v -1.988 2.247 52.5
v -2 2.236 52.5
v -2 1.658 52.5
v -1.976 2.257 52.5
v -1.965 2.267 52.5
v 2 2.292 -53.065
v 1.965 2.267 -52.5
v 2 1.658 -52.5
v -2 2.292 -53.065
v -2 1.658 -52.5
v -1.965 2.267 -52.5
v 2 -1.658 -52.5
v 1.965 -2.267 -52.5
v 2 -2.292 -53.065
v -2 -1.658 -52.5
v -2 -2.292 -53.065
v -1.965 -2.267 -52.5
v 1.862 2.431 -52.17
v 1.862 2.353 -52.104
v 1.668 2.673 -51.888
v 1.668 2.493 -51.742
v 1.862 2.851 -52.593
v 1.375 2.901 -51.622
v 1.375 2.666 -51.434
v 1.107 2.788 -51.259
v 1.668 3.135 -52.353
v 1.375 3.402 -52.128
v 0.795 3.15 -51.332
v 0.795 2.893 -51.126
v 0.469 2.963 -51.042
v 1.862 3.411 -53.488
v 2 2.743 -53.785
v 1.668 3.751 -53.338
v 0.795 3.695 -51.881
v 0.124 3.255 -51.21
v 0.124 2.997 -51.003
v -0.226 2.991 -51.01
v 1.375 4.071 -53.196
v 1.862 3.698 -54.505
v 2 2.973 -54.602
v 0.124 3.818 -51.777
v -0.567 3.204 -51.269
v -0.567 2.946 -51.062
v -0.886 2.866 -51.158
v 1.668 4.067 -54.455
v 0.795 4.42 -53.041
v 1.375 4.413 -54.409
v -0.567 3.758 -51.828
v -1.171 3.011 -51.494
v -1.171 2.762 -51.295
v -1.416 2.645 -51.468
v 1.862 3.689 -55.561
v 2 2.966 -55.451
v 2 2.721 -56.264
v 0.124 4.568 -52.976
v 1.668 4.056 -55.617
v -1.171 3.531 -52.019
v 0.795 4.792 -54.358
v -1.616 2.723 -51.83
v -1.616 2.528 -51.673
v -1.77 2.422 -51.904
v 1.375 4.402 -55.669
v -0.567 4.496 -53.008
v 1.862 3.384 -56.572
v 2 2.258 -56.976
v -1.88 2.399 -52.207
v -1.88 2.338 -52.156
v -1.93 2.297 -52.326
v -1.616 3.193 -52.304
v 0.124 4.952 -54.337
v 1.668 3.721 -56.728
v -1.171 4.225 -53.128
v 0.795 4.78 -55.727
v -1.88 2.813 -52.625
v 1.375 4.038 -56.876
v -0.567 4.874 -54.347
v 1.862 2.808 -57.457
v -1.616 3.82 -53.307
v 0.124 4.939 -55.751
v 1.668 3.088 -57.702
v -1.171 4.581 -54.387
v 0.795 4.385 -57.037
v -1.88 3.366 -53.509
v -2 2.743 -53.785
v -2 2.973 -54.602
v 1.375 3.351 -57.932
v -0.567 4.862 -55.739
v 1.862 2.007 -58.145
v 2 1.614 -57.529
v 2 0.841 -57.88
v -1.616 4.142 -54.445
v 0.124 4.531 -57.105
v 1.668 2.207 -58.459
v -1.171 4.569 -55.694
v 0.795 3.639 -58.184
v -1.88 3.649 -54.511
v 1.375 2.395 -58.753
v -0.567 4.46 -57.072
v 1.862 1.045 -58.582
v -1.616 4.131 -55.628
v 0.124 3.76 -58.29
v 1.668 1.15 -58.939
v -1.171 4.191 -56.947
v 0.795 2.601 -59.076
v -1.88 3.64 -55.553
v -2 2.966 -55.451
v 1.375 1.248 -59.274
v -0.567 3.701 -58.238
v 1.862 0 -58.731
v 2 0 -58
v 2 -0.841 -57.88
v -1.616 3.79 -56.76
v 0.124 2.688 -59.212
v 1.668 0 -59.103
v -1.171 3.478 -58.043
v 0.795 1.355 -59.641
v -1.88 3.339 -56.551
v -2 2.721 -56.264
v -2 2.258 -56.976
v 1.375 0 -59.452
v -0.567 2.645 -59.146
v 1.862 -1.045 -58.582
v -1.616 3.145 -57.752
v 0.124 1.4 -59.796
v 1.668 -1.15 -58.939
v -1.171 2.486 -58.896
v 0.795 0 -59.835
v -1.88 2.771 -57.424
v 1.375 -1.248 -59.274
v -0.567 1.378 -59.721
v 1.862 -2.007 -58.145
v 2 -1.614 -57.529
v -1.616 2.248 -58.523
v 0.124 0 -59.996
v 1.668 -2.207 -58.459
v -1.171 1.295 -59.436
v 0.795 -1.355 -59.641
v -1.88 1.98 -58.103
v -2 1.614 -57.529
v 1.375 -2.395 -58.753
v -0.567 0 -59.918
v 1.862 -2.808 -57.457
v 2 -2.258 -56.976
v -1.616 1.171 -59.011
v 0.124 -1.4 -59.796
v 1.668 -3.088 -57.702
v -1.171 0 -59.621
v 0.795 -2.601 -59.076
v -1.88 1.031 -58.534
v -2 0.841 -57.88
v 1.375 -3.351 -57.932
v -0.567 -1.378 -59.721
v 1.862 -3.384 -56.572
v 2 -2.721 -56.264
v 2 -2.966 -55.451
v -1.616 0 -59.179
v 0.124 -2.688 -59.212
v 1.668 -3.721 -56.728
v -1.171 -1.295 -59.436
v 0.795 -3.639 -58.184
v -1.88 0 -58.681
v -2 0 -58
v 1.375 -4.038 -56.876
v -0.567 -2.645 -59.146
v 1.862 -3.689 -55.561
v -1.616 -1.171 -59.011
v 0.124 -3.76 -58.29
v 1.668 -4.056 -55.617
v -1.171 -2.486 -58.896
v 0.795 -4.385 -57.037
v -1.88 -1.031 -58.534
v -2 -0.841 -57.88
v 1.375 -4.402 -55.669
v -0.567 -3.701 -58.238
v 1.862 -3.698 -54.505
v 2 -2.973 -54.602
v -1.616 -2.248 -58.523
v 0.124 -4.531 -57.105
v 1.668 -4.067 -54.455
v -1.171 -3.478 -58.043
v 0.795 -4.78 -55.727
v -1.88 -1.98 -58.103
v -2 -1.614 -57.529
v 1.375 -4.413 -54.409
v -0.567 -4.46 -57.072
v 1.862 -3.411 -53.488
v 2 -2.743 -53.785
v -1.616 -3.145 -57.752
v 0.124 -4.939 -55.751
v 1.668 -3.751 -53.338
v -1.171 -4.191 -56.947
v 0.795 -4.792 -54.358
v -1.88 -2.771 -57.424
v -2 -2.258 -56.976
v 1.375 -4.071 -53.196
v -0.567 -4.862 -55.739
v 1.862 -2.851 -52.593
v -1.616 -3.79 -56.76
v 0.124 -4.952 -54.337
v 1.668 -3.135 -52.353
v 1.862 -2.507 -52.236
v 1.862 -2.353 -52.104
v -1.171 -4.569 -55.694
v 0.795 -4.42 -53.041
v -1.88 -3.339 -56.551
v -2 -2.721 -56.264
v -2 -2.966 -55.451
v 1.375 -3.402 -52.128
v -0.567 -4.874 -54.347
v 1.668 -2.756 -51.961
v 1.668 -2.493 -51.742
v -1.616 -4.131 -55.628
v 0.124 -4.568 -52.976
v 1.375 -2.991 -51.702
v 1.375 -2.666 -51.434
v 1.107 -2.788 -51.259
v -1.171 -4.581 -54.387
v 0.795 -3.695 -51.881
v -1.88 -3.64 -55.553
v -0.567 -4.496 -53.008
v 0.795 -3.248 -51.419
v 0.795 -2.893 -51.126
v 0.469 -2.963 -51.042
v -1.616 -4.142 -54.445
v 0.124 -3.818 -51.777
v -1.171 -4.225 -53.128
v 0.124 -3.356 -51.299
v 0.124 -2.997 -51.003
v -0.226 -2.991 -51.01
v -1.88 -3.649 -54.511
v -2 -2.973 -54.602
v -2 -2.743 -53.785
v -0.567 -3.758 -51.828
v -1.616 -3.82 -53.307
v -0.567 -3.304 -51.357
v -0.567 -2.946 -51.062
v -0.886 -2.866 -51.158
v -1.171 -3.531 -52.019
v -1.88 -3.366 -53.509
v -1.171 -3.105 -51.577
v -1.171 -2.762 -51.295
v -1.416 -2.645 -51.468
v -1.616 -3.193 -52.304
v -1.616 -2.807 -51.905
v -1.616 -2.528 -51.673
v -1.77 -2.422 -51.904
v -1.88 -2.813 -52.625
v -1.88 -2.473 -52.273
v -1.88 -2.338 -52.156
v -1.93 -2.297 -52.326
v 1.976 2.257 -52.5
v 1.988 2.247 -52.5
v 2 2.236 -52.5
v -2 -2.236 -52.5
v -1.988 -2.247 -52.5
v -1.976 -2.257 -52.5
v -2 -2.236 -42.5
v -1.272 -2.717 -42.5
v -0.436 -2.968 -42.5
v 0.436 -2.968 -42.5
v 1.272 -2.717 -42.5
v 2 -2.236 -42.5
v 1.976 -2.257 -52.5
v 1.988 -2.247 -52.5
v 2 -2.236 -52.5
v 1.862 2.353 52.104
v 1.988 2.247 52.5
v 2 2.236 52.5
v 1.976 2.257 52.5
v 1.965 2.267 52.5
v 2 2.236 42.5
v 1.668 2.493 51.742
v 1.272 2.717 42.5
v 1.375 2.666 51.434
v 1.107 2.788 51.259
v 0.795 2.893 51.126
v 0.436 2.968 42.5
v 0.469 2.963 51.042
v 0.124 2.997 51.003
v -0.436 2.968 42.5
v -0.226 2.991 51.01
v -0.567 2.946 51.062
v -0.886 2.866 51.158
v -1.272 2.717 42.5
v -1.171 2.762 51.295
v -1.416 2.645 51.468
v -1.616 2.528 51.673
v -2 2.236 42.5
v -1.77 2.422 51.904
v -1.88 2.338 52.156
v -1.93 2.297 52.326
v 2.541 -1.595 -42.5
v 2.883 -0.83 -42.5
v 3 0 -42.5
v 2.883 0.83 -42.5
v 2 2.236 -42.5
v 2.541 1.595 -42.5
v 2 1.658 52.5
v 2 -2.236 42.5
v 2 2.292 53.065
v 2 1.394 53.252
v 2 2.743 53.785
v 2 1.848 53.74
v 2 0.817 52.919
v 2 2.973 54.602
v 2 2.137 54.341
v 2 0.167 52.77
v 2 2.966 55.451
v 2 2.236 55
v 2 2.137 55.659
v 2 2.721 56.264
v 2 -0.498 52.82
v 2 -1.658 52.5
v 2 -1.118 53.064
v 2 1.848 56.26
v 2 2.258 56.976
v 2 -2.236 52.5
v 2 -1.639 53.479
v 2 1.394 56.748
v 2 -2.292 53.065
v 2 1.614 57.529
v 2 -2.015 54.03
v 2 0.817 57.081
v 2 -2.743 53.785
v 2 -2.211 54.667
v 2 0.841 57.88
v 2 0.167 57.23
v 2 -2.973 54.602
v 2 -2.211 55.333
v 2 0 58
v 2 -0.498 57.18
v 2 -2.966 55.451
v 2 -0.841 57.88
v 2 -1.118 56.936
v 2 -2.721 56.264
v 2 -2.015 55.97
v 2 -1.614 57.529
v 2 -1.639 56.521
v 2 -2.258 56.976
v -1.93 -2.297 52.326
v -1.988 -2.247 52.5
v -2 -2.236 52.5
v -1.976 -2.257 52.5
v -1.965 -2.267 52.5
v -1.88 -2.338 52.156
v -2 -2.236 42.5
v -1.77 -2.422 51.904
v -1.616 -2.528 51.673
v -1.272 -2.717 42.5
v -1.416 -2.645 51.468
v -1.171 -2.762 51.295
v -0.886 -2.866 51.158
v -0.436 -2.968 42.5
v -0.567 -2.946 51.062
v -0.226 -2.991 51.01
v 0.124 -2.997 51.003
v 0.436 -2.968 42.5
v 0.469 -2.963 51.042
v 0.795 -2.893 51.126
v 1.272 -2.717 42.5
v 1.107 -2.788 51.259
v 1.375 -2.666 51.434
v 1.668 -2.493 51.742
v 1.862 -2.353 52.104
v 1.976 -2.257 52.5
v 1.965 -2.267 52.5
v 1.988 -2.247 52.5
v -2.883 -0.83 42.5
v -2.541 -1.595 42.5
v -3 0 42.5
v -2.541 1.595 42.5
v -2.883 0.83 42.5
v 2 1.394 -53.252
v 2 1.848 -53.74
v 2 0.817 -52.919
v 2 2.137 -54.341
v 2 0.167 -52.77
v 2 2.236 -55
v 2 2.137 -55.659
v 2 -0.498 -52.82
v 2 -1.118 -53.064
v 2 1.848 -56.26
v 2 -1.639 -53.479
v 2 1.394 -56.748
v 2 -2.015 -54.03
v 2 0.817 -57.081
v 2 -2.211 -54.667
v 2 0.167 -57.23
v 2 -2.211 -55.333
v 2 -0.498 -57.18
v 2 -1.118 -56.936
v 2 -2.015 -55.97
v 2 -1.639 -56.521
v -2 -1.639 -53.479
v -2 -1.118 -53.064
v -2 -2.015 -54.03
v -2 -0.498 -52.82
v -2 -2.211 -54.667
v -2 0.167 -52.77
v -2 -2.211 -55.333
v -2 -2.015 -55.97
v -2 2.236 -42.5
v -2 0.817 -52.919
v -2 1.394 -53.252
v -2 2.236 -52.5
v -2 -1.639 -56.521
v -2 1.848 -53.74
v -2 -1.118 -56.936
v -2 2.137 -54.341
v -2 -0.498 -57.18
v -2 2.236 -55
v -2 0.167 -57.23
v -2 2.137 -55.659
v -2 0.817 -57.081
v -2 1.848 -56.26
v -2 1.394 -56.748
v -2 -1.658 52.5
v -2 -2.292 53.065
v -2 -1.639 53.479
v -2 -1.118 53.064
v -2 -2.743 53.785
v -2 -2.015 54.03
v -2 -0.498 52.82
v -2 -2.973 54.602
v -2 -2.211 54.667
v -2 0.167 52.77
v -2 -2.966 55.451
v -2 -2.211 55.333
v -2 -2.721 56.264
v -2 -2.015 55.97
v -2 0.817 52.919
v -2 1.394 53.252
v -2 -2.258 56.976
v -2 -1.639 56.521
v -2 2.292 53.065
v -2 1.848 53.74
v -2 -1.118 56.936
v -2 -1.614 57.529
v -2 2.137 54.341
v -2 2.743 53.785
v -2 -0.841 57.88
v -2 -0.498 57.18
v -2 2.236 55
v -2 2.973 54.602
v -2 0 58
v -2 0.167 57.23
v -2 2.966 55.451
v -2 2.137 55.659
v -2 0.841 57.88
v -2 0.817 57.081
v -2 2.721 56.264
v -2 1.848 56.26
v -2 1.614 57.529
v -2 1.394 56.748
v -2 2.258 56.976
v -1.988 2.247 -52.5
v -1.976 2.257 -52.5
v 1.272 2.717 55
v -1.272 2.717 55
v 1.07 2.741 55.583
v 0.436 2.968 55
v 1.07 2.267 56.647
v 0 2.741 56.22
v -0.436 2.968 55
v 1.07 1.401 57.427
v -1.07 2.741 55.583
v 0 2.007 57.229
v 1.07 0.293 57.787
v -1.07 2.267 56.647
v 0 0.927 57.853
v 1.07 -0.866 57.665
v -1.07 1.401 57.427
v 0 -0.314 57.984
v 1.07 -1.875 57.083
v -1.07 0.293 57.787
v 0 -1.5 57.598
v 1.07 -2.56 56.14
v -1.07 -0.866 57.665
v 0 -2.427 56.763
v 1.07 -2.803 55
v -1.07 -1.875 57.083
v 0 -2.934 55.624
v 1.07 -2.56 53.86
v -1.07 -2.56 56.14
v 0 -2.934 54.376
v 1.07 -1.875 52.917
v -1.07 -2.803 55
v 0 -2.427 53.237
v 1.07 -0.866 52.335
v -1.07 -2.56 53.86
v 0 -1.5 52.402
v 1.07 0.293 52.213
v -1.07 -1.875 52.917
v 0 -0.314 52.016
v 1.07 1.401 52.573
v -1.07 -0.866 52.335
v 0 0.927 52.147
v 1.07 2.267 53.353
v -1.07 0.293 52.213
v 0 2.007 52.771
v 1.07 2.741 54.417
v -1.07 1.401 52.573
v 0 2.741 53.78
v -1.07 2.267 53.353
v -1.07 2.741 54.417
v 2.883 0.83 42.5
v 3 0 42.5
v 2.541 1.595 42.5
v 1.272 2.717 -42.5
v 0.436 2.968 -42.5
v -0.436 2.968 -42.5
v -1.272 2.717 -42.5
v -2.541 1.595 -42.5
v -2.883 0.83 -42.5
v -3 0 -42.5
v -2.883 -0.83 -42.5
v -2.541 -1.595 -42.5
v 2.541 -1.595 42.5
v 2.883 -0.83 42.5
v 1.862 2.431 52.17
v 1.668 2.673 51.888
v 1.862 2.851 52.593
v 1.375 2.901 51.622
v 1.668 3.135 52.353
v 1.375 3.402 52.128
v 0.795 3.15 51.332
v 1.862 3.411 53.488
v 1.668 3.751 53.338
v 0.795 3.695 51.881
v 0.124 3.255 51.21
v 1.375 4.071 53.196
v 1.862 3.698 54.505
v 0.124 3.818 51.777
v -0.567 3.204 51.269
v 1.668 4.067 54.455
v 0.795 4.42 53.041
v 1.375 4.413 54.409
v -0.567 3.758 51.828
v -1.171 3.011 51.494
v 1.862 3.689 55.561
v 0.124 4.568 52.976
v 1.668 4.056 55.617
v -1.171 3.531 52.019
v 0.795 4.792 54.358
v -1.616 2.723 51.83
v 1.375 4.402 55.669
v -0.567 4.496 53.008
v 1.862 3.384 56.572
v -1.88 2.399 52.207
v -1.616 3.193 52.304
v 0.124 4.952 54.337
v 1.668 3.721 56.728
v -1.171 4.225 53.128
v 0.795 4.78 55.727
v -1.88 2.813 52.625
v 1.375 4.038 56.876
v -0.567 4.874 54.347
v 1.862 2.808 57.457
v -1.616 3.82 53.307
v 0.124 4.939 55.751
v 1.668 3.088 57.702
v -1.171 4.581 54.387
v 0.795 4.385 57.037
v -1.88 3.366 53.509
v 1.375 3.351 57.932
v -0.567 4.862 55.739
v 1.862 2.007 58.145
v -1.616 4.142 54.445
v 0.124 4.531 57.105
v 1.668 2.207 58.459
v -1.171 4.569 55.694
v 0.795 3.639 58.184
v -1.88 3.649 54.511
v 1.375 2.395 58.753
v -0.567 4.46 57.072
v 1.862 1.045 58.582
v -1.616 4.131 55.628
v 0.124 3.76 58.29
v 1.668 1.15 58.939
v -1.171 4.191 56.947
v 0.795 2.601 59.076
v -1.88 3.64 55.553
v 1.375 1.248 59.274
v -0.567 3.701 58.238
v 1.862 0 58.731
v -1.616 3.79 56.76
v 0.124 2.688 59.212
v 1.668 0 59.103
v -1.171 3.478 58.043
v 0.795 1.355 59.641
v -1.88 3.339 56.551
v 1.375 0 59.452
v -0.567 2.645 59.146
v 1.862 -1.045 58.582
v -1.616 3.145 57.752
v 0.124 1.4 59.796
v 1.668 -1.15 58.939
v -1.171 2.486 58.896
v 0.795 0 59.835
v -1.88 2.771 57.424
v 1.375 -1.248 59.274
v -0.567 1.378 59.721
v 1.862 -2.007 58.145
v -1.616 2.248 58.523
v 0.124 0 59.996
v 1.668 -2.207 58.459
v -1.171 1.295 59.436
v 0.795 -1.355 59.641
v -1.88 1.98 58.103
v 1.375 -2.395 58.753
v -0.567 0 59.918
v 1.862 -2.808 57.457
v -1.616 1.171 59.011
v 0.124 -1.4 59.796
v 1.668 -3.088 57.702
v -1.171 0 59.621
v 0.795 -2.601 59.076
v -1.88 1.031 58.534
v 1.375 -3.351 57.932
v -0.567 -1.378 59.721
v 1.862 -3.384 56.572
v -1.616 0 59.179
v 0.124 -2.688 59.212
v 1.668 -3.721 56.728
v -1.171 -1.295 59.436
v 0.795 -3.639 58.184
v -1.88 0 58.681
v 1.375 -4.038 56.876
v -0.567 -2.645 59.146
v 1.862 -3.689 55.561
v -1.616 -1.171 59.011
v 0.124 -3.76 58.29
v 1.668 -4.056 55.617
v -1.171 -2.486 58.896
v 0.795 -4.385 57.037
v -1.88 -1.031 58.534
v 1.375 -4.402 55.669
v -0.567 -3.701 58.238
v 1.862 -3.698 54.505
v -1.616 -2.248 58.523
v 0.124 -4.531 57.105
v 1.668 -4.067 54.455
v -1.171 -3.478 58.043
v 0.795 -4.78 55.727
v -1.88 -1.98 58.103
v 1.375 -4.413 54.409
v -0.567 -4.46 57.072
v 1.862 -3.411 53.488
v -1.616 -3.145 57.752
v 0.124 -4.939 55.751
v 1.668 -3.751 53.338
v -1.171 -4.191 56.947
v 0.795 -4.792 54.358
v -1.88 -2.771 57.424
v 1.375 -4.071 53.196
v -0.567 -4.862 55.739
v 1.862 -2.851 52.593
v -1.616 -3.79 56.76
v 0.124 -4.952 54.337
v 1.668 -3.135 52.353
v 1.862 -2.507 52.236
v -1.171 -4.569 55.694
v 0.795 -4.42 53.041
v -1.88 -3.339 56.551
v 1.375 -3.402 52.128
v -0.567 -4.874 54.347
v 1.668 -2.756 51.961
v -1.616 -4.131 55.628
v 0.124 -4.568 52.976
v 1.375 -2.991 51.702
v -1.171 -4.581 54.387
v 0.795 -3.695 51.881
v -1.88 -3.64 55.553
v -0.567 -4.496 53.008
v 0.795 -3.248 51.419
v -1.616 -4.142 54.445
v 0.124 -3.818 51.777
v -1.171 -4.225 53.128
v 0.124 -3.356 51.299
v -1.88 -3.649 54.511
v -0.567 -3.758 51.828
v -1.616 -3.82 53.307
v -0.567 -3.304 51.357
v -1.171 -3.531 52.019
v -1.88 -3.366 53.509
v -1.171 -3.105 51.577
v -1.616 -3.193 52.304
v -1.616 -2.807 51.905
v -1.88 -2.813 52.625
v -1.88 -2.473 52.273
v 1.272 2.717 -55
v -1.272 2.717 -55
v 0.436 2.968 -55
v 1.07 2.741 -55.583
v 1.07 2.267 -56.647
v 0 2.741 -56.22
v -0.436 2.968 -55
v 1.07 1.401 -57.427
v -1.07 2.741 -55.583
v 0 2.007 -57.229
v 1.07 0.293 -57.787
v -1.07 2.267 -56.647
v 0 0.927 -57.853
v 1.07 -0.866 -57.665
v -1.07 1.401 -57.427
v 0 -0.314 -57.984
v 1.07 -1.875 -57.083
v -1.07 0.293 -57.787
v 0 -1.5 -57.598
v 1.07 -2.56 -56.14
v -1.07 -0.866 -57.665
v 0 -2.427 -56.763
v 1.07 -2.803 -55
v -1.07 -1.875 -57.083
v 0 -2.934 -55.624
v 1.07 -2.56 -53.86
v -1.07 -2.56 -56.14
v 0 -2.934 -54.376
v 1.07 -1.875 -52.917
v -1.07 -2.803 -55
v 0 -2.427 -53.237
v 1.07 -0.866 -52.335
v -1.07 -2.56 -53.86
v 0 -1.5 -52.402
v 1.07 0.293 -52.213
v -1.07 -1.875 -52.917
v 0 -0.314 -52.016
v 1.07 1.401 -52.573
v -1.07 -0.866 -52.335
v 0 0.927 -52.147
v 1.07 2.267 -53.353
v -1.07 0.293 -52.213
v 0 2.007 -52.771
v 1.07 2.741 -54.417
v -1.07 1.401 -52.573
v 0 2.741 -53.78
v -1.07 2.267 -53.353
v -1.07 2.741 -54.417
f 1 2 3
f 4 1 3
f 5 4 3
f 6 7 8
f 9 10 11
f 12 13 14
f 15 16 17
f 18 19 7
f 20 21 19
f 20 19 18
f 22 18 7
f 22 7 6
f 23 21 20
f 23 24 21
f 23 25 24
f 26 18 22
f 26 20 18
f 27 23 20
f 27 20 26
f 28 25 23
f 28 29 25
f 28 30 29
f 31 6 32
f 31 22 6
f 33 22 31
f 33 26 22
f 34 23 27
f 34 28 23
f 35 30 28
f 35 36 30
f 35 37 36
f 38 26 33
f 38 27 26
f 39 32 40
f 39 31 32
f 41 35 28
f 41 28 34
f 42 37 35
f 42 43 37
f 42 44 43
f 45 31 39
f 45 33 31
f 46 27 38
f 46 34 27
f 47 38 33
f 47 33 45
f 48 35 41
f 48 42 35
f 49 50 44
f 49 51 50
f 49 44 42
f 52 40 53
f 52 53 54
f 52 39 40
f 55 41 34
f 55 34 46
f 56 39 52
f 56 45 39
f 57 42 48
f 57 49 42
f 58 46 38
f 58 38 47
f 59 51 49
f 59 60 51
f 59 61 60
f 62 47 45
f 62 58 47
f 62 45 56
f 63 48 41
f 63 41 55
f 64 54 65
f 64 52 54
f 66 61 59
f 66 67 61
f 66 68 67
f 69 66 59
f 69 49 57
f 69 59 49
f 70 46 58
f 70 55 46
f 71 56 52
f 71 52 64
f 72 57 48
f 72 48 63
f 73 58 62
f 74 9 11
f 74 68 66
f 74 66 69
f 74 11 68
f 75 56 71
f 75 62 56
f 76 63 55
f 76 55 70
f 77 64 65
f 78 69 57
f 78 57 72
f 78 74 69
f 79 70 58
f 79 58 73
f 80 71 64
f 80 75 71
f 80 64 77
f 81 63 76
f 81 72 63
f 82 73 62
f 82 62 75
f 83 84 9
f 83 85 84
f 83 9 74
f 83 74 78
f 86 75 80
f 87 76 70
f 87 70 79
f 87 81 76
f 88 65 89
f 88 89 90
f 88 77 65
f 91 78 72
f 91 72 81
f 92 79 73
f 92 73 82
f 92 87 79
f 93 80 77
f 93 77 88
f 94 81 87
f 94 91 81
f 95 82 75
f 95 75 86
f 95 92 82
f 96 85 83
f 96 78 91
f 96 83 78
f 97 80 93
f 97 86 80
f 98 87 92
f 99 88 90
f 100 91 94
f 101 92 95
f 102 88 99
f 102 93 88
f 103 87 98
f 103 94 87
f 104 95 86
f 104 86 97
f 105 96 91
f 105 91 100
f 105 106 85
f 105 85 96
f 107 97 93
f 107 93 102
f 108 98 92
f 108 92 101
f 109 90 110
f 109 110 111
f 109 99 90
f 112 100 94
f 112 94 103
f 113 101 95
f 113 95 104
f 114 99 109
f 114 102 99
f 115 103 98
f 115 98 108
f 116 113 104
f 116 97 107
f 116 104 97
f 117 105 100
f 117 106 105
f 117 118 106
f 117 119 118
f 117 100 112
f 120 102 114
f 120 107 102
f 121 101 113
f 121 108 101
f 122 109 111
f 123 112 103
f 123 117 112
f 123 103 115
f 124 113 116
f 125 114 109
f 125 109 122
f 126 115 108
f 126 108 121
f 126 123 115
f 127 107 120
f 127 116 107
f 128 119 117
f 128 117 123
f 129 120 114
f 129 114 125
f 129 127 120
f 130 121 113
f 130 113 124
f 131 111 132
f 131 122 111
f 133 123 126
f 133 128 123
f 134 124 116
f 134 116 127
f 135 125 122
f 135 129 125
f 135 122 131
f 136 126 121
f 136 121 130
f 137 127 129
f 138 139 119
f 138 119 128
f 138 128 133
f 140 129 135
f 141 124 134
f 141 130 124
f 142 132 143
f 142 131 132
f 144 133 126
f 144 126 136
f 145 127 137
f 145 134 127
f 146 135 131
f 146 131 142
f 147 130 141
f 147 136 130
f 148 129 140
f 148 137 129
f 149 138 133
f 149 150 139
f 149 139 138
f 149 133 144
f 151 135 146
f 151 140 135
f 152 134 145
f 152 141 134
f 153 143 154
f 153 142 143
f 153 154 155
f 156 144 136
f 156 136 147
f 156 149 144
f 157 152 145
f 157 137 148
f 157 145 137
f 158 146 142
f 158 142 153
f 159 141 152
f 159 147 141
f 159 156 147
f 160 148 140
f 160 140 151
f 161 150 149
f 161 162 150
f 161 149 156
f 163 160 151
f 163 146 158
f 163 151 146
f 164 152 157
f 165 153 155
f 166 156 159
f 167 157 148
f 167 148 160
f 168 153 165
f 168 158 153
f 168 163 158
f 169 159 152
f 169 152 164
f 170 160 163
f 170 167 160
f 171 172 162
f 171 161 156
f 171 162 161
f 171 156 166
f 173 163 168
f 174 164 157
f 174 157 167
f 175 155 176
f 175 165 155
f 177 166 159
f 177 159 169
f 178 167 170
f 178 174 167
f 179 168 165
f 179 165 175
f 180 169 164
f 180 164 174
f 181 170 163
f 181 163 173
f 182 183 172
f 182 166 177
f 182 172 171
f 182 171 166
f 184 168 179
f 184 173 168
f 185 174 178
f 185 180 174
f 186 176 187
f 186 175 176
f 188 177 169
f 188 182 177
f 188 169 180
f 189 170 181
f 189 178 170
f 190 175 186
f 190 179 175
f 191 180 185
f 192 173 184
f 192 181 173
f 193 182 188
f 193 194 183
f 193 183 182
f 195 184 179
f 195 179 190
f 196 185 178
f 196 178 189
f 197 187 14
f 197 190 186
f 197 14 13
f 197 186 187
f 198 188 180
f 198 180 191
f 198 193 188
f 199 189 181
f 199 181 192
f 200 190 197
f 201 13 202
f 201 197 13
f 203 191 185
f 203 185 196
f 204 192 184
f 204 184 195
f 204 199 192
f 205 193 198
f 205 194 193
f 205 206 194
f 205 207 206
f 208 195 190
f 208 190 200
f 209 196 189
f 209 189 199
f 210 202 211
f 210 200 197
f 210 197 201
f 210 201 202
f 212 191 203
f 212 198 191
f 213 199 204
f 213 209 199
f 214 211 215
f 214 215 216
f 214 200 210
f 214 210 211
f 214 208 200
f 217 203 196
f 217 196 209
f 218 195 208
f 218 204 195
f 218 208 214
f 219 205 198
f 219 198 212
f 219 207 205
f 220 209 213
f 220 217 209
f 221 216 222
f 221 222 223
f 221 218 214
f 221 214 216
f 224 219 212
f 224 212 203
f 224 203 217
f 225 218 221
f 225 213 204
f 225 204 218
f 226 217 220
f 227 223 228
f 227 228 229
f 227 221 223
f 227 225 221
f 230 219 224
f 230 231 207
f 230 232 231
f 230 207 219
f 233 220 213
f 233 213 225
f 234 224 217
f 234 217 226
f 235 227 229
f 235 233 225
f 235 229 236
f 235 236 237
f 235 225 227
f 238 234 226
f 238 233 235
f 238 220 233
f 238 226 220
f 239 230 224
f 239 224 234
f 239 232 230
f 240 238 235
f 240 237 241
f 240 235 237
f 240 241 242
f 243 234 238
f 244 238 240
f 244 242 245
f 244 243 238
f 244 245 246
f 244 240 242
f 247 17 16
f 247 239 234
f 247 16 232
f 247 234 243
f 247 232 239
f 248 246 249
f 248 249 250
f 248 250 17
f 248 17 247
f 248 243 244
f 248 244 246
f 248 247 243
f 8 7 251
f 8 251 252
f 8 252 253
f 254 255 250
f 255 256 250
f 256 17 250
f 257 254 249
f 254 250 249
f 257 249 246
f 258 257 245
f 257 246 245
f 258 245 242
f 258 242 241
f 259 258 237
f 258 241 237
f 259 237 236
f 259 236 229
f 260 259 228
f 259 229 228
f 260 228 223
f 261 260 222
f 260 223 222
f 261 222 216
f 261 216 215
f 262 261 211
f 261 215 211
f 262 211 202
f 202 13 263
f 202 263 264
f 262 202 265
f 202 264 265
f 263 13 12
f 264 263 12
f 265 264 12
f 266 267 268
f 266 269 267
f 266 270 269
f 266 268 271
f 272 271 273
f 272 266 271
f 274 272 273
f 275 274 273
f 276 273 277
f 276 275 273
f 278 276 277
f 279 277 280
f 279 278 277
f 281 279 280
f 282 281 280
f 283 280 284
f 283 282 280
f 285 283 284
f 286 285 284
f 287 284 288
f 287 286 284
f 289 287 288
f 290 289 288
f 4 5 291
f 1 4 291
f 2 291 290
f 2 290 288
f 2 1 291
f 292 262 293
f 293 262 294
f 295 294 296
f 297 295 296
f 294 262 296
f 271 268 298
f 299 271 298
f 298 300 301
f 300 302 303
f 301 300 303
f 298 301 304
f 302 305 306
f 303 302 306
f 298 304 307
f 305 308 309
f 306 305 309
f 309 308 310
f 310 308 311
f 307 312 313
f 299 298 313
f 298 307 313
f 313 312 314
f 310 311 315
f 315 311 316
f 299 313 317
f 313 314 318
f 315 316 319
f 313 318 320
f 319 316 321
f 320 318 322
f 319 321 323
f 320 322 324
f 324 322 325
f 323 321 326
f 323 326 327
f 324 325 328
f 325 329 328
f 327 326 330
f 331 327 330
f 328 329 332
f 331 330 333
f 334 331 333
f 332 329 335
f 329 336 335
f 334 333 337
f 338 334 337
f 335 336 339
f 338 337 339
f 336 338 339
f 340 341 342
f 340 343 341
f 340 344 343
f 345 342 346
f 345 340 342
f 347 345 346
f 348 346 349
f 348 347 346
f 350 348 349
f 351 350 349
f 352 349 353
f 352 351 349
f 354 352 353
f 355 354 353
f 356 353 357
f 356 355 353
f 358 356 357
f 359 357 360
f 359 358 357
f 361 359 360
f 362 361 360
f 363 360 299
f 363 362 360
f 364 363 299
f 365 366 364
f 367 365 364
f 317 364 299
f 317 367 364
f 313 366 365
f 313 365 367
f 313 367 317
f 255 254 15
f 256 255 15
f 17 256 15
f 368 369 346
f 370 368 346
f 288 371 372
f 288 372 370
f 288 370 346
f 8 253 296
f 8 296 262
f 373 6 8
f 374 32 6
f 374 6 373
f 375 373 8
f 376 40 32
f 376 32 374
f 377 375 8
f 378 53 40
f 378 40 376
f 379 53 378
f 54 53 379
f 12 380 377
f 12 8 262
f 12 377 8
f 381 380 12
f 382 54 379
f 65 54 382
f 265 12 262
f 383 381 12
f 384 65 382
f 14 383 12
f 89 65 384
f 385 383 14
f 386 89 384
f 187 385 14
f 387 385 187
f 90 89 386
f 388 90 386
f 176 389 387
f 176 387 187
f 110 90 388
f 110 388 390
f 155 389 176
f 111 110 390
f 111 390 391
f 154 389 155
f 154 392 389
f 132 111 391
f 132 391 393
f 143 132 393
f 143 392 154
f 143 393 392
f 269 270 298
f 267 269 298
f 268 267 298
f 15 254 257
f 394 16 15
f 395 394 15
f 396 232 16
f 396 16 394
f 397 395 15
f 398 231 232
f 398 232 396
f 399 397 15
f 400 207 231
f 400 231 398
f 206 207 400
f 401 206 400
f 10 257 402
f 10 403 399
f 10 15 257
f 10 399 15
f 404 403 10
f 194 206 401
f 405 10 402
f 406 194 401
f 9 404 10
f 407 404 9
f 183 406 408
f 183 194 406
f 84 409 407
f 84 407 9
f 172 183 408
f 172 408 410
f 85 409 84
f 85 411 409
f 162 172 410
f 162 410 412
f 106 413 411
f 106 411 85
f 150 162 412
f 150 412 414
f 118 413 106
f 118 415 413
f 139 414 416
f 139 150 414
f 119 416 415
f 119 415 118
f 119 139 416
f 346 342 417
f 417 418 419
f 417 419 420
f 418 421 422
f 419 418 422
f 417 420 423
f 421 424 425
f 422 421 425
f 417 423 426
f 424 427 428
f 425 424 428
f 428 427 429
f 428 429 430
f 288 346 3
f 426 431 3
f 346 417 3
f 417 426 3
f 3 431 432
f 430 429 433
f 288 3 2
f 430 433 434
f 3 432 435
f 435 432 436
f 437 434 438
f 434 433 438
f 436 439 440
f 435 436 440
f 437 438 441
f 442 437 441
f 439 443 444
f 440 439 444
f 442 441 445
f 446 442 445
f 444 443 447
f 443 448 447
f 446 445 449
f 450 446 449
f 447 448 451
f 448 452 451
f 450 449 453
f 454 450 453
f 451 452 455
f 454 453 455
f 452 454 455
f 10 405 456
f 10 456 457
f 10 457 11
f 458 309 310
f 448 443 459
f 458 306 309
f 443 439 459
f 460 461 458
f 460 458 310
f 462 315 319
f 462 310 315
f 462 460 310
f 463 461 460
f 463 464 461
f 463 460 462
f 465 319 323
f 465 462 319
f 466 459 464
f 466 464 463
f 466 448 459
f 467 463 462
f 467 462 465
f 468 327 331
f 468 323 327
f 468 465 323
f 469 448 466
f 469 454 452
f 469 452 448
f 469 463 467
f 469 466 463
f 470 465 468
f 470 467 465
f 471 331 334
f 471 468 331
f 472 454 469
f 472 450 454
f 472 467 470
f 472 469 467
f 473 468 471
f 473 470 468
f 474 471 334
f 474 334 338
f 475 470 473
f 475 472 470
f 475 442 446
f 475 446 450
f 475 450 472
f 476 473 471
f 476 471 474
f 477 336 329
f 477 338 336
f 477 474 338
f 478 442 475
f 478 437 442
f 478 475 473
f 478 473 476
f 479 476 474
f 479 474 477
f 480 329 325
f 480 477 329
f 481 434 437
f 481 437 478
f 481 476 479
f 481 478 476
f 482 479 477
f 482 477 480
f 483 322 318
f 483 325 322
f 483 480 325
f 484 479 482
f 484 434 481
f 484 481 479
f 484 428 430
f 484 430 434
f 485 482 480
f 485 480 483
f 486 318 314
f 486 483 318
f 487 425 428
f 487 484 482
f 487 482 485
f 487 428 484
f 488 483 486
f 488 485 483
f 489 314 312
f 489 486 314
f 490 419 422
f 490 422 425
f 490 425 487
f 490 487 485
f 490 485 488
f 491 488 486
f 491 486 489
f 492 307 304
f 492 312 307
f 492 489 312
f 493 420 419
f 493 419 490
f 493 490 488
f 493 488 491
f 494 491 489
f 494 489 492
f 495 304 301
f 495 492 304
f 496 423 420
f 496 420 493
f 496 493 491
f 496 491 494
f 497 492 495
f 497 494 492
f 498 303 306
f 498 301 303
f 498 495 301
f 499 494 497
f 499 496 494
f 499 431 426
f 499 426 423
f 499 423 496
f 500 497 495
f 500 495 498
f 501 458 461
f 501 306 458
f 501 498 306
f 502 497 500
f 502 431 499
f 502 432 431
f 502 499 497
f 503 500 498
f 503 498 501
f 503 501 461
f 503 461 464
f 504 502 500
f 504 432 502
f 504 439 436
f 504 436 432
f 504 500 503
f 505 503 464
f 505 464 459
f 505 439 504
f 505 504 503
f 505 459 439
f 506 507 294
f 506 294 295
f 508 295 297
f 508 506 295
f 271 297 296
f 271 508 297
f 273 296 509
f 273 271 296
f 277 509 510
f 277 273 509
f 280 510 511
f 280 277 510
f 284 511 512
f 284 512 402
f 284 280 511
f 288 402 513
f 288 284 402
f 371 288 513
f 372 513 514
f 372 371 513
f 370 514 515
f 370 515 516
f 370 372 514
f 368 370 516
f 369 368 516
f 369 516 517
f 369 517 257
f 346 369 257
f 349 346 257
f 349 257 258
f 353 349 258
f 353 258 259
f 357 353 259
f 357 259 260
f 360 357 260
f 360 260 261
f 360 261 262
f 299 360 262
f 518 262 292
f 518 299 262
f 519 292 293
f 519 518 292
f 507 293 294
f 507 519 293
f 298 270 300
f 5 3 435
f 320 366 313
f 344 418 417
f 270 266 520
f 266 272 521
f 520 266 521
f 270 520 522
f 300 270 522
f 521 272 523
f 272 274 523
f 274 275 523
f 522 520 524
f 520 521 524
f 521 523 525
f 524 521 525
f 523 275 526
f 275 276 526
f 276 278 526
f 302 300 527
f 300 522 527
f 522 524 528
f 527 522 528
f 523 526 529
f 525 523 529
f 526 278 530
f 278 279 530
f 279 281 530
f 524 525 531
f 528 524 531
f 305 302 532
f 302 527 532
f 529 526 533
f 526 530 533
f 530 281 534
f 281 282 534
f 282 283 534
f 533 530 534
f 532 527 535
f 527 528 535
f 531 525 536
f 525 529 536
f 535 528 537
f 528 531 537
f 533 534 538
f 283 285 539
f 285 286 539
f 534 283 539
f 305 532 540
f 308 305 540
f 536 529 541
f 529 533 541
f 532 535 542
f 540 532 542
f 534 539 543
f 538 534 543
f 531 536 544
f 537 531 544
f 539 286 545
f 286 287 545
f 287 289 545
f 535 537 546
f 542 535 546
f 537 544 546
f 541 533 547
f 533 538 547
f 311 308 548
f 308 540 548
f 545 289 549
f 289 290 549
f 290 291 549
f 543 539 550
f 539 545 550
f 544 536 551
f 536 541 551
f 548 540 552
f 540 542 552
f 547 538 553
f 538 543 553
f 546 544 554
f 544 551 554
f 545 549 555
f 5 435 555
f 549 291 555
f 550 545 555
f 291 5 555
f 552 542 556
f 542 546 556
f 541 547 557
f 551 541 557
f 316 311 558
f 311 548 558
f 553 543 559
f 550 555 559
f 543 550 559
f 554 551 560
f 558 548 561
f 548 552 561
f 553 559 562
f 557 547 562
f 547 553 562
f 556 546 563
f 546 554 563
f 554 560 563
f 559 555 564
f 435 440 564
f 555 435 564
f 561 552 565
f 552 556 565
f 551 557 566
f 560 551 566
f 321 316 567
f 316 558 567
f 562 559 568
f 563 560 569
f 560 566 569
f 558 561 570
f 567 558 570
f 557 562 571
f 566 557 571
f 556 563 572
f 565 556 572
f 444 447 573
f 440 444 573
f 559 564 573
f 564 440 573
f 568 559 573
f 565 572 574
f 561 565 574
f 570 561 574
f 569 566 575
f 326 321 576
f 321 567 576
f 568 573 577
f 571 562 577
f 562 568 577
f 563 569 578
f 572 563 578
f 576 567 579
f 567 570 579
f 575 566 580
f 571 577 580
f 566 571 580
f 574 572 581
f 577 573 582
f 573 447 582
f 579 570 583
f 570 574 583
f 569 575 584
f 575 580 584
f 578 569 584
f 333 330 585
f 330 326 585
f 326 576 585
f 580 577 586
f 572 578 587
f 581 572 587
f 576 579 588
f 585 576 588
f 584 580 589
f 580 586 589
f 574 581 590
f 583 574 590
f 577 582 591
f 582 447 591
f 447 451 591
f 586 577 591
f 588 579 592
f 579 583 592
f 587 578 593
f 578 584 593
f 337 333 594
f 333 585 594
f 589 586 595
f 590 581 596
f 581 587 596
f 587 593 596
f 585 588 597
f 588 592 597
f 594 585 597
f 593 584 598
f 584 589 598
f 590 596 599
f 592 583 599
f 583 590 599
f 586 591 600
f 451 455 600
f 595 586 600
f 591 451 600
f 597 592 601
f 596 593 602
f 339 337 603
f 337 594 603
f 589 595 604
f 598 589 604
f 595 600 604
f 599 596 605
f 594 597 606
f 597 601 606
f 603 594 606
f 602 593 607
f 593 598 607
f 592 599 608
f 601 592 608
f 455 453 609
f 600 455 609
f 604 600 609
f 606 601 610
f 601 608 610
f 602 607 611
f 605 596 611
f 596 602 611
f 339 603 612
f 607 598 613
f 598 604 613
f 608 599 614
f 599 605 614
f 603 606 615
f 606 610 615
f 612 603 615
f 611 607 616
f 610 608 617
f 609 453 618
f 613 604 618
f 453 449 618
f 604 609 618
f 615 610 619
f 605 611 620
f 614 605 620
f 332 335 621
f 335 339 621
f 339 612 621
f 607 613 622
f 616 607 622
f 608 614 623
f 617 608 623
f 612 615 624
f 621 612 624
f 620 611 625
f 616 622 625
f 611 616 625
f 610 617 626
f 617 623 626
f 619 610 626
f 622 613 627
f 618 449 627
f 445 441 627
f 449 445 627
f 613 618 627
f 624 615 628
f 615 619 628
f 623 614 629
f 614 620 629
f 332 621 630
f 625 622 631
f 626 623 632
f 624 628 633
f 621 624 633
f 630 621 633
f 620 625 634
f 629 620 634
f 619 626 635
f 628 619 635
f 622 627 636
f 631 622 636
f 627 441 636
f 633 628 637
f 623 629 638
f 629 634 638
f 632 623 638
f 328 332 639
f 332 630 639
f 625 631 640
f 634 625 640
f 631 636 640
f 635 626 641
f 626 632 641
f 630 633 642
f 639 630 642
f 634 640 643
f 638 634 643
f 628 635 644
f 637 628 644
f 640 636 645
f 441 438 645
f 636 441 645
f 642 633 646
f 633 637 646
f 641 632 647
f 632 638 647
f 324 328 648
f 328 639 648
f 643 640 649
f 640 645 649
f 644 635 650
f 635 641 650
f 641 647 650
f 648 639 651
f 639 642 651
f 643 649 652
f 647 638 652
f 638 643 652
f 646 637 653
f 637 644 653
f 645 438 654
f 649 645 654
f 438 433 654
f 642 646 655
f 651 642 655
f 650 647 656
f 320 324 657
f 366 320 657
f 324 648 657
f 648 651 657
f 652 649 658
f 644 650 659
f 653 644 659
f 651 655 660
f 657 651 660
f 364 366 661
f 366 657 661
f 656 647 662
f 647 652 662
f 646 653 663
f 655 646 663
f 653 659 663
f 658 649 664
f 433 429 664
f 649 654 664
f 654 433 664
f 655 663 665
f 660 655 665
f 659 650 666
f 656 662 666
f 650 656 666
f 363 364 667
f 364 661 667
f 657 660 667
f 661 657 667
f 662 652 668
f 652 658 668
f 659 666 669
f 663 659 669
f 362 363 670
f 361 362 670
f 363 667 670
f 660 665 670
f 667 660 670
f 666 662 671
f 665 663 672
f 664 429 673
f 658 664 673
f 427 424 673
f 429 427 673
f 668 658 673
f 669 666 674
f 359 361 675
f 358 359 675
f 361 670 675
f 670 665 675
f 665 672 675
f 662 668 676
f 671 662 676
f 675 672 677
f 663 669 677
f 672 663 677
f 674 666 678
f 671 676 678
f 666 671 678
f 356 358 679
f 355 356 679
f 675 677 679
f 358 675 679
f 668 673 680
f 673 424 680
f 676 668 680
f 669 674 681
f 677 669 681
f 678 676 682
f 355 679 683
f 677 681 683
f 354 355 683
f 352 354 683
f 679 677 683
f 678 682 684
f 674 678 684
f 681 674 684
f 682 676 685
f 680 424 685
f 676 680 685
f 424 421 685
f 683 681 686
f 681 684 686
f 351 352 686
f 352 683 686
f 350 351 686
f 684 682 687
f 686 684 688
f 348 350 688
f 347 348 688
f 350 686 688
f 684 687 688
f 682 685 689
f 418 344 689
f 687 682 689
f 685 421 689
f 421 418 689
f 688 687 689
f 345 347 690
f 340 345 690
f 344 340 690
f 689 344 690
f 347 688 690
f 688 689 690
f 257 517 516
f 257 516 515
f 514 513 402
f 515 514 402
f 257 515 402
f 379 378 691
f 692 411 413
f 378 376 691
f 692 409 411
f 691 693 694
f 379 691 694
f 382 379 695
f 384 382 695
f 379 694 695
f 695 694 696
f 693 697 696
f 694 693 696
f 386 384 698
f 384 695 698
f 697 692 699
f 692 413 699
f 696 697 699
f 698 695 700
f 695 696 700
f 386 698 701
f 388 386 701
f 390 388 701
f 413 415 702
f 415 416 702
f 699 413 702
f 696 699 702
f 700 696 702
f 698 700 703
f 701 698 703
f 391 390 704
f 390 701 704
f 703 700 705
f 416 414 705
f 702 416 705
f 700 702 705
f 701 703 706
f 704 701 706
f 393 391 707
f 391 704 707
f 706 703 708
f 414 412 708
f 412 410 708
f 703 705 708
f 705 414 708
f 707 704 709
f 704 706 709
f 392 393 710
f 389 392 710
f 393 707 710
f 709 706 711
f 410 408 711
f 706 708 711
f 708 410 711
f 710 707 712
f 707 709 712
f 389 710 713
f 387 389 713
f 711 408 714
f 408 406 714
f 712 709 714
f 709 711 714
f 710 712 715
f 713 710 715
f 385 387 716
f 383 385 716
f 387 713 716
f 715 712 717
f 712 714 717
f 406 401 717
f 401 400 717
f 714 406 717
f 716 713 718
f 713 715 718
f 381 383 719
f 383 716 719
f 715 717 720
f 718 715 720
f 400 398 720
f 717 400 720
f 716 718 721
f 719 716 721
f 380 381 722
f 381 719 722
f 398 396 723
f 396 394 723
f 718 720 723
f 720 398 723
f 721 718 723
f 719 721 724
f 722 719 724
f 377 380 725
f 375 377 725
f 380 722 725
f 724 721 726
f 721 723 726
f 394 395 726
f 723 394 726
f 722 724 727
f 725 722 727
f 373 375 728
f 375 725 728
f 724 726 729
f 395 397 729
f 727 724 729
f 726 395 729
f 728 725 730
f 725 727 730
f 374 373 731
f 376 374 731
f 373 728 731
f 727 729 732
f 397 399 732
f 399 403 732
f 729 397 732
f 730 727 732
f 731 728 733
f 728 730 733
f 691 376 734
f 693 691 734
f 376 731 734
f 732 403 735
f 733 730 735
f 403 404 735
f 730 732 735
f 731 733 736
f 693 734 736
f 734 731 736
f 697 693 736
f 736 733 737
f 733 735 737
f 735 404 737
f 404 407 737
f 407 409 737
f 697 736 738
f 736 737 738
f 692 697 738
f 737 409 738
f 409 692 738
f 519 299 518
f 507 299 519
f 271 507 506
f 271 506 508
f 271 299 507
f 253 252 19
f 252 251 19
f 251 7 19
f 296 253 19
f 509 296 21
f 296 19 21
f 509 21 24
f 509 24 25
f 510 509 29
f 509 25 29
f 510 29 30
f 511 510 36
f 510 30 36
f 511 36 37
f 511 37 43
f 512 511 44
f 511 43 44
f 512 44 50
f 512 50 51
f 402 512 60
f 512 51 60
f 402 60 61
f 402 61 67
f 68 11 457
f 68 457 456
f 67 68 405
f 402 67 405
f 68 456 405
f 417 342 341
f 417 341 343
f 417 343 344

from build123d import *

# Parameters (mm, degrees)
SKETCH_1_R      = 3
EXTRUDE_1_DEPTH = 42.5
EXTRUDE_START   = 10
EXTRUDE_2_DEPTH = 10


with BuildPart() as part:
    # 草图1 → 凸台-拉伸1 (new, symmetric)
    with BuildSketch(Plane.XY):
        Circle(SKETCH_1_R)
    extrude(amount=EXTRUDE_1_DEPTH, both=True)

    # 草图2 → 凸台-拉伸2 (add)
    with BuildSketch(Plane.XY.offset(42.5).offset(EXTRUDE_START)):
        with BuildLine():
            ThreePointArc((2, 2.236067977), (0, 3), (-2, 2.236067977))
            Line((-2, 2.236067977), (-2, -2.236067977))
            ThreePointArc((-2, -2.236067977), (0, -3), (2, -2.236067977))
            Line((2, -2.236067977), (2, 2.236067977))
        make_face()
    extrude_2 = extrude(amount=-EXTRUDE_2_DEPTH)

    # 草图3 → 旋转1 (revolve)
    with BuildSketch(Plane.XY.offset(55)):
        with BuildLine():
            Line((-2, 3), (-2, 0))
            Line((-2, 0), (2, 0))
            Line((2, 0), (2, 3))
            ThreePointArc((2, 3), (0, 5), (-2, 3))
        make_face()
    revolve_1 = revolve(axis=Axis((0, 0, 55), (1, 0, 0)))

    # 草图4 → 切除-旋转1 (revolve, cut)
    with BuildSketch(Plane.XY.offset(55)):
        with BuildLine():
            Line((-3, 0), (3, 0))
            ThreePointArc((3, 0), (0, 3), (-3, 0))
        make_face()
    cut_revolve_1 = revolve(axis=Axis((-3.468207888, 0, 55), (1, 0, 0)), mode=Mode.SUBTRACT)

    # 镜向1: 凸台-拉伸2, 旋转1, 切除-旋转1 across plane
    add(extrude_2.mirror(Plane.XY))
    add(revolve_1.mirror(Plane.XY))
    add(cut_revolve_1.mirror(Plane.XY), mode=Mode.SUBTRACT)


solid = part.part
